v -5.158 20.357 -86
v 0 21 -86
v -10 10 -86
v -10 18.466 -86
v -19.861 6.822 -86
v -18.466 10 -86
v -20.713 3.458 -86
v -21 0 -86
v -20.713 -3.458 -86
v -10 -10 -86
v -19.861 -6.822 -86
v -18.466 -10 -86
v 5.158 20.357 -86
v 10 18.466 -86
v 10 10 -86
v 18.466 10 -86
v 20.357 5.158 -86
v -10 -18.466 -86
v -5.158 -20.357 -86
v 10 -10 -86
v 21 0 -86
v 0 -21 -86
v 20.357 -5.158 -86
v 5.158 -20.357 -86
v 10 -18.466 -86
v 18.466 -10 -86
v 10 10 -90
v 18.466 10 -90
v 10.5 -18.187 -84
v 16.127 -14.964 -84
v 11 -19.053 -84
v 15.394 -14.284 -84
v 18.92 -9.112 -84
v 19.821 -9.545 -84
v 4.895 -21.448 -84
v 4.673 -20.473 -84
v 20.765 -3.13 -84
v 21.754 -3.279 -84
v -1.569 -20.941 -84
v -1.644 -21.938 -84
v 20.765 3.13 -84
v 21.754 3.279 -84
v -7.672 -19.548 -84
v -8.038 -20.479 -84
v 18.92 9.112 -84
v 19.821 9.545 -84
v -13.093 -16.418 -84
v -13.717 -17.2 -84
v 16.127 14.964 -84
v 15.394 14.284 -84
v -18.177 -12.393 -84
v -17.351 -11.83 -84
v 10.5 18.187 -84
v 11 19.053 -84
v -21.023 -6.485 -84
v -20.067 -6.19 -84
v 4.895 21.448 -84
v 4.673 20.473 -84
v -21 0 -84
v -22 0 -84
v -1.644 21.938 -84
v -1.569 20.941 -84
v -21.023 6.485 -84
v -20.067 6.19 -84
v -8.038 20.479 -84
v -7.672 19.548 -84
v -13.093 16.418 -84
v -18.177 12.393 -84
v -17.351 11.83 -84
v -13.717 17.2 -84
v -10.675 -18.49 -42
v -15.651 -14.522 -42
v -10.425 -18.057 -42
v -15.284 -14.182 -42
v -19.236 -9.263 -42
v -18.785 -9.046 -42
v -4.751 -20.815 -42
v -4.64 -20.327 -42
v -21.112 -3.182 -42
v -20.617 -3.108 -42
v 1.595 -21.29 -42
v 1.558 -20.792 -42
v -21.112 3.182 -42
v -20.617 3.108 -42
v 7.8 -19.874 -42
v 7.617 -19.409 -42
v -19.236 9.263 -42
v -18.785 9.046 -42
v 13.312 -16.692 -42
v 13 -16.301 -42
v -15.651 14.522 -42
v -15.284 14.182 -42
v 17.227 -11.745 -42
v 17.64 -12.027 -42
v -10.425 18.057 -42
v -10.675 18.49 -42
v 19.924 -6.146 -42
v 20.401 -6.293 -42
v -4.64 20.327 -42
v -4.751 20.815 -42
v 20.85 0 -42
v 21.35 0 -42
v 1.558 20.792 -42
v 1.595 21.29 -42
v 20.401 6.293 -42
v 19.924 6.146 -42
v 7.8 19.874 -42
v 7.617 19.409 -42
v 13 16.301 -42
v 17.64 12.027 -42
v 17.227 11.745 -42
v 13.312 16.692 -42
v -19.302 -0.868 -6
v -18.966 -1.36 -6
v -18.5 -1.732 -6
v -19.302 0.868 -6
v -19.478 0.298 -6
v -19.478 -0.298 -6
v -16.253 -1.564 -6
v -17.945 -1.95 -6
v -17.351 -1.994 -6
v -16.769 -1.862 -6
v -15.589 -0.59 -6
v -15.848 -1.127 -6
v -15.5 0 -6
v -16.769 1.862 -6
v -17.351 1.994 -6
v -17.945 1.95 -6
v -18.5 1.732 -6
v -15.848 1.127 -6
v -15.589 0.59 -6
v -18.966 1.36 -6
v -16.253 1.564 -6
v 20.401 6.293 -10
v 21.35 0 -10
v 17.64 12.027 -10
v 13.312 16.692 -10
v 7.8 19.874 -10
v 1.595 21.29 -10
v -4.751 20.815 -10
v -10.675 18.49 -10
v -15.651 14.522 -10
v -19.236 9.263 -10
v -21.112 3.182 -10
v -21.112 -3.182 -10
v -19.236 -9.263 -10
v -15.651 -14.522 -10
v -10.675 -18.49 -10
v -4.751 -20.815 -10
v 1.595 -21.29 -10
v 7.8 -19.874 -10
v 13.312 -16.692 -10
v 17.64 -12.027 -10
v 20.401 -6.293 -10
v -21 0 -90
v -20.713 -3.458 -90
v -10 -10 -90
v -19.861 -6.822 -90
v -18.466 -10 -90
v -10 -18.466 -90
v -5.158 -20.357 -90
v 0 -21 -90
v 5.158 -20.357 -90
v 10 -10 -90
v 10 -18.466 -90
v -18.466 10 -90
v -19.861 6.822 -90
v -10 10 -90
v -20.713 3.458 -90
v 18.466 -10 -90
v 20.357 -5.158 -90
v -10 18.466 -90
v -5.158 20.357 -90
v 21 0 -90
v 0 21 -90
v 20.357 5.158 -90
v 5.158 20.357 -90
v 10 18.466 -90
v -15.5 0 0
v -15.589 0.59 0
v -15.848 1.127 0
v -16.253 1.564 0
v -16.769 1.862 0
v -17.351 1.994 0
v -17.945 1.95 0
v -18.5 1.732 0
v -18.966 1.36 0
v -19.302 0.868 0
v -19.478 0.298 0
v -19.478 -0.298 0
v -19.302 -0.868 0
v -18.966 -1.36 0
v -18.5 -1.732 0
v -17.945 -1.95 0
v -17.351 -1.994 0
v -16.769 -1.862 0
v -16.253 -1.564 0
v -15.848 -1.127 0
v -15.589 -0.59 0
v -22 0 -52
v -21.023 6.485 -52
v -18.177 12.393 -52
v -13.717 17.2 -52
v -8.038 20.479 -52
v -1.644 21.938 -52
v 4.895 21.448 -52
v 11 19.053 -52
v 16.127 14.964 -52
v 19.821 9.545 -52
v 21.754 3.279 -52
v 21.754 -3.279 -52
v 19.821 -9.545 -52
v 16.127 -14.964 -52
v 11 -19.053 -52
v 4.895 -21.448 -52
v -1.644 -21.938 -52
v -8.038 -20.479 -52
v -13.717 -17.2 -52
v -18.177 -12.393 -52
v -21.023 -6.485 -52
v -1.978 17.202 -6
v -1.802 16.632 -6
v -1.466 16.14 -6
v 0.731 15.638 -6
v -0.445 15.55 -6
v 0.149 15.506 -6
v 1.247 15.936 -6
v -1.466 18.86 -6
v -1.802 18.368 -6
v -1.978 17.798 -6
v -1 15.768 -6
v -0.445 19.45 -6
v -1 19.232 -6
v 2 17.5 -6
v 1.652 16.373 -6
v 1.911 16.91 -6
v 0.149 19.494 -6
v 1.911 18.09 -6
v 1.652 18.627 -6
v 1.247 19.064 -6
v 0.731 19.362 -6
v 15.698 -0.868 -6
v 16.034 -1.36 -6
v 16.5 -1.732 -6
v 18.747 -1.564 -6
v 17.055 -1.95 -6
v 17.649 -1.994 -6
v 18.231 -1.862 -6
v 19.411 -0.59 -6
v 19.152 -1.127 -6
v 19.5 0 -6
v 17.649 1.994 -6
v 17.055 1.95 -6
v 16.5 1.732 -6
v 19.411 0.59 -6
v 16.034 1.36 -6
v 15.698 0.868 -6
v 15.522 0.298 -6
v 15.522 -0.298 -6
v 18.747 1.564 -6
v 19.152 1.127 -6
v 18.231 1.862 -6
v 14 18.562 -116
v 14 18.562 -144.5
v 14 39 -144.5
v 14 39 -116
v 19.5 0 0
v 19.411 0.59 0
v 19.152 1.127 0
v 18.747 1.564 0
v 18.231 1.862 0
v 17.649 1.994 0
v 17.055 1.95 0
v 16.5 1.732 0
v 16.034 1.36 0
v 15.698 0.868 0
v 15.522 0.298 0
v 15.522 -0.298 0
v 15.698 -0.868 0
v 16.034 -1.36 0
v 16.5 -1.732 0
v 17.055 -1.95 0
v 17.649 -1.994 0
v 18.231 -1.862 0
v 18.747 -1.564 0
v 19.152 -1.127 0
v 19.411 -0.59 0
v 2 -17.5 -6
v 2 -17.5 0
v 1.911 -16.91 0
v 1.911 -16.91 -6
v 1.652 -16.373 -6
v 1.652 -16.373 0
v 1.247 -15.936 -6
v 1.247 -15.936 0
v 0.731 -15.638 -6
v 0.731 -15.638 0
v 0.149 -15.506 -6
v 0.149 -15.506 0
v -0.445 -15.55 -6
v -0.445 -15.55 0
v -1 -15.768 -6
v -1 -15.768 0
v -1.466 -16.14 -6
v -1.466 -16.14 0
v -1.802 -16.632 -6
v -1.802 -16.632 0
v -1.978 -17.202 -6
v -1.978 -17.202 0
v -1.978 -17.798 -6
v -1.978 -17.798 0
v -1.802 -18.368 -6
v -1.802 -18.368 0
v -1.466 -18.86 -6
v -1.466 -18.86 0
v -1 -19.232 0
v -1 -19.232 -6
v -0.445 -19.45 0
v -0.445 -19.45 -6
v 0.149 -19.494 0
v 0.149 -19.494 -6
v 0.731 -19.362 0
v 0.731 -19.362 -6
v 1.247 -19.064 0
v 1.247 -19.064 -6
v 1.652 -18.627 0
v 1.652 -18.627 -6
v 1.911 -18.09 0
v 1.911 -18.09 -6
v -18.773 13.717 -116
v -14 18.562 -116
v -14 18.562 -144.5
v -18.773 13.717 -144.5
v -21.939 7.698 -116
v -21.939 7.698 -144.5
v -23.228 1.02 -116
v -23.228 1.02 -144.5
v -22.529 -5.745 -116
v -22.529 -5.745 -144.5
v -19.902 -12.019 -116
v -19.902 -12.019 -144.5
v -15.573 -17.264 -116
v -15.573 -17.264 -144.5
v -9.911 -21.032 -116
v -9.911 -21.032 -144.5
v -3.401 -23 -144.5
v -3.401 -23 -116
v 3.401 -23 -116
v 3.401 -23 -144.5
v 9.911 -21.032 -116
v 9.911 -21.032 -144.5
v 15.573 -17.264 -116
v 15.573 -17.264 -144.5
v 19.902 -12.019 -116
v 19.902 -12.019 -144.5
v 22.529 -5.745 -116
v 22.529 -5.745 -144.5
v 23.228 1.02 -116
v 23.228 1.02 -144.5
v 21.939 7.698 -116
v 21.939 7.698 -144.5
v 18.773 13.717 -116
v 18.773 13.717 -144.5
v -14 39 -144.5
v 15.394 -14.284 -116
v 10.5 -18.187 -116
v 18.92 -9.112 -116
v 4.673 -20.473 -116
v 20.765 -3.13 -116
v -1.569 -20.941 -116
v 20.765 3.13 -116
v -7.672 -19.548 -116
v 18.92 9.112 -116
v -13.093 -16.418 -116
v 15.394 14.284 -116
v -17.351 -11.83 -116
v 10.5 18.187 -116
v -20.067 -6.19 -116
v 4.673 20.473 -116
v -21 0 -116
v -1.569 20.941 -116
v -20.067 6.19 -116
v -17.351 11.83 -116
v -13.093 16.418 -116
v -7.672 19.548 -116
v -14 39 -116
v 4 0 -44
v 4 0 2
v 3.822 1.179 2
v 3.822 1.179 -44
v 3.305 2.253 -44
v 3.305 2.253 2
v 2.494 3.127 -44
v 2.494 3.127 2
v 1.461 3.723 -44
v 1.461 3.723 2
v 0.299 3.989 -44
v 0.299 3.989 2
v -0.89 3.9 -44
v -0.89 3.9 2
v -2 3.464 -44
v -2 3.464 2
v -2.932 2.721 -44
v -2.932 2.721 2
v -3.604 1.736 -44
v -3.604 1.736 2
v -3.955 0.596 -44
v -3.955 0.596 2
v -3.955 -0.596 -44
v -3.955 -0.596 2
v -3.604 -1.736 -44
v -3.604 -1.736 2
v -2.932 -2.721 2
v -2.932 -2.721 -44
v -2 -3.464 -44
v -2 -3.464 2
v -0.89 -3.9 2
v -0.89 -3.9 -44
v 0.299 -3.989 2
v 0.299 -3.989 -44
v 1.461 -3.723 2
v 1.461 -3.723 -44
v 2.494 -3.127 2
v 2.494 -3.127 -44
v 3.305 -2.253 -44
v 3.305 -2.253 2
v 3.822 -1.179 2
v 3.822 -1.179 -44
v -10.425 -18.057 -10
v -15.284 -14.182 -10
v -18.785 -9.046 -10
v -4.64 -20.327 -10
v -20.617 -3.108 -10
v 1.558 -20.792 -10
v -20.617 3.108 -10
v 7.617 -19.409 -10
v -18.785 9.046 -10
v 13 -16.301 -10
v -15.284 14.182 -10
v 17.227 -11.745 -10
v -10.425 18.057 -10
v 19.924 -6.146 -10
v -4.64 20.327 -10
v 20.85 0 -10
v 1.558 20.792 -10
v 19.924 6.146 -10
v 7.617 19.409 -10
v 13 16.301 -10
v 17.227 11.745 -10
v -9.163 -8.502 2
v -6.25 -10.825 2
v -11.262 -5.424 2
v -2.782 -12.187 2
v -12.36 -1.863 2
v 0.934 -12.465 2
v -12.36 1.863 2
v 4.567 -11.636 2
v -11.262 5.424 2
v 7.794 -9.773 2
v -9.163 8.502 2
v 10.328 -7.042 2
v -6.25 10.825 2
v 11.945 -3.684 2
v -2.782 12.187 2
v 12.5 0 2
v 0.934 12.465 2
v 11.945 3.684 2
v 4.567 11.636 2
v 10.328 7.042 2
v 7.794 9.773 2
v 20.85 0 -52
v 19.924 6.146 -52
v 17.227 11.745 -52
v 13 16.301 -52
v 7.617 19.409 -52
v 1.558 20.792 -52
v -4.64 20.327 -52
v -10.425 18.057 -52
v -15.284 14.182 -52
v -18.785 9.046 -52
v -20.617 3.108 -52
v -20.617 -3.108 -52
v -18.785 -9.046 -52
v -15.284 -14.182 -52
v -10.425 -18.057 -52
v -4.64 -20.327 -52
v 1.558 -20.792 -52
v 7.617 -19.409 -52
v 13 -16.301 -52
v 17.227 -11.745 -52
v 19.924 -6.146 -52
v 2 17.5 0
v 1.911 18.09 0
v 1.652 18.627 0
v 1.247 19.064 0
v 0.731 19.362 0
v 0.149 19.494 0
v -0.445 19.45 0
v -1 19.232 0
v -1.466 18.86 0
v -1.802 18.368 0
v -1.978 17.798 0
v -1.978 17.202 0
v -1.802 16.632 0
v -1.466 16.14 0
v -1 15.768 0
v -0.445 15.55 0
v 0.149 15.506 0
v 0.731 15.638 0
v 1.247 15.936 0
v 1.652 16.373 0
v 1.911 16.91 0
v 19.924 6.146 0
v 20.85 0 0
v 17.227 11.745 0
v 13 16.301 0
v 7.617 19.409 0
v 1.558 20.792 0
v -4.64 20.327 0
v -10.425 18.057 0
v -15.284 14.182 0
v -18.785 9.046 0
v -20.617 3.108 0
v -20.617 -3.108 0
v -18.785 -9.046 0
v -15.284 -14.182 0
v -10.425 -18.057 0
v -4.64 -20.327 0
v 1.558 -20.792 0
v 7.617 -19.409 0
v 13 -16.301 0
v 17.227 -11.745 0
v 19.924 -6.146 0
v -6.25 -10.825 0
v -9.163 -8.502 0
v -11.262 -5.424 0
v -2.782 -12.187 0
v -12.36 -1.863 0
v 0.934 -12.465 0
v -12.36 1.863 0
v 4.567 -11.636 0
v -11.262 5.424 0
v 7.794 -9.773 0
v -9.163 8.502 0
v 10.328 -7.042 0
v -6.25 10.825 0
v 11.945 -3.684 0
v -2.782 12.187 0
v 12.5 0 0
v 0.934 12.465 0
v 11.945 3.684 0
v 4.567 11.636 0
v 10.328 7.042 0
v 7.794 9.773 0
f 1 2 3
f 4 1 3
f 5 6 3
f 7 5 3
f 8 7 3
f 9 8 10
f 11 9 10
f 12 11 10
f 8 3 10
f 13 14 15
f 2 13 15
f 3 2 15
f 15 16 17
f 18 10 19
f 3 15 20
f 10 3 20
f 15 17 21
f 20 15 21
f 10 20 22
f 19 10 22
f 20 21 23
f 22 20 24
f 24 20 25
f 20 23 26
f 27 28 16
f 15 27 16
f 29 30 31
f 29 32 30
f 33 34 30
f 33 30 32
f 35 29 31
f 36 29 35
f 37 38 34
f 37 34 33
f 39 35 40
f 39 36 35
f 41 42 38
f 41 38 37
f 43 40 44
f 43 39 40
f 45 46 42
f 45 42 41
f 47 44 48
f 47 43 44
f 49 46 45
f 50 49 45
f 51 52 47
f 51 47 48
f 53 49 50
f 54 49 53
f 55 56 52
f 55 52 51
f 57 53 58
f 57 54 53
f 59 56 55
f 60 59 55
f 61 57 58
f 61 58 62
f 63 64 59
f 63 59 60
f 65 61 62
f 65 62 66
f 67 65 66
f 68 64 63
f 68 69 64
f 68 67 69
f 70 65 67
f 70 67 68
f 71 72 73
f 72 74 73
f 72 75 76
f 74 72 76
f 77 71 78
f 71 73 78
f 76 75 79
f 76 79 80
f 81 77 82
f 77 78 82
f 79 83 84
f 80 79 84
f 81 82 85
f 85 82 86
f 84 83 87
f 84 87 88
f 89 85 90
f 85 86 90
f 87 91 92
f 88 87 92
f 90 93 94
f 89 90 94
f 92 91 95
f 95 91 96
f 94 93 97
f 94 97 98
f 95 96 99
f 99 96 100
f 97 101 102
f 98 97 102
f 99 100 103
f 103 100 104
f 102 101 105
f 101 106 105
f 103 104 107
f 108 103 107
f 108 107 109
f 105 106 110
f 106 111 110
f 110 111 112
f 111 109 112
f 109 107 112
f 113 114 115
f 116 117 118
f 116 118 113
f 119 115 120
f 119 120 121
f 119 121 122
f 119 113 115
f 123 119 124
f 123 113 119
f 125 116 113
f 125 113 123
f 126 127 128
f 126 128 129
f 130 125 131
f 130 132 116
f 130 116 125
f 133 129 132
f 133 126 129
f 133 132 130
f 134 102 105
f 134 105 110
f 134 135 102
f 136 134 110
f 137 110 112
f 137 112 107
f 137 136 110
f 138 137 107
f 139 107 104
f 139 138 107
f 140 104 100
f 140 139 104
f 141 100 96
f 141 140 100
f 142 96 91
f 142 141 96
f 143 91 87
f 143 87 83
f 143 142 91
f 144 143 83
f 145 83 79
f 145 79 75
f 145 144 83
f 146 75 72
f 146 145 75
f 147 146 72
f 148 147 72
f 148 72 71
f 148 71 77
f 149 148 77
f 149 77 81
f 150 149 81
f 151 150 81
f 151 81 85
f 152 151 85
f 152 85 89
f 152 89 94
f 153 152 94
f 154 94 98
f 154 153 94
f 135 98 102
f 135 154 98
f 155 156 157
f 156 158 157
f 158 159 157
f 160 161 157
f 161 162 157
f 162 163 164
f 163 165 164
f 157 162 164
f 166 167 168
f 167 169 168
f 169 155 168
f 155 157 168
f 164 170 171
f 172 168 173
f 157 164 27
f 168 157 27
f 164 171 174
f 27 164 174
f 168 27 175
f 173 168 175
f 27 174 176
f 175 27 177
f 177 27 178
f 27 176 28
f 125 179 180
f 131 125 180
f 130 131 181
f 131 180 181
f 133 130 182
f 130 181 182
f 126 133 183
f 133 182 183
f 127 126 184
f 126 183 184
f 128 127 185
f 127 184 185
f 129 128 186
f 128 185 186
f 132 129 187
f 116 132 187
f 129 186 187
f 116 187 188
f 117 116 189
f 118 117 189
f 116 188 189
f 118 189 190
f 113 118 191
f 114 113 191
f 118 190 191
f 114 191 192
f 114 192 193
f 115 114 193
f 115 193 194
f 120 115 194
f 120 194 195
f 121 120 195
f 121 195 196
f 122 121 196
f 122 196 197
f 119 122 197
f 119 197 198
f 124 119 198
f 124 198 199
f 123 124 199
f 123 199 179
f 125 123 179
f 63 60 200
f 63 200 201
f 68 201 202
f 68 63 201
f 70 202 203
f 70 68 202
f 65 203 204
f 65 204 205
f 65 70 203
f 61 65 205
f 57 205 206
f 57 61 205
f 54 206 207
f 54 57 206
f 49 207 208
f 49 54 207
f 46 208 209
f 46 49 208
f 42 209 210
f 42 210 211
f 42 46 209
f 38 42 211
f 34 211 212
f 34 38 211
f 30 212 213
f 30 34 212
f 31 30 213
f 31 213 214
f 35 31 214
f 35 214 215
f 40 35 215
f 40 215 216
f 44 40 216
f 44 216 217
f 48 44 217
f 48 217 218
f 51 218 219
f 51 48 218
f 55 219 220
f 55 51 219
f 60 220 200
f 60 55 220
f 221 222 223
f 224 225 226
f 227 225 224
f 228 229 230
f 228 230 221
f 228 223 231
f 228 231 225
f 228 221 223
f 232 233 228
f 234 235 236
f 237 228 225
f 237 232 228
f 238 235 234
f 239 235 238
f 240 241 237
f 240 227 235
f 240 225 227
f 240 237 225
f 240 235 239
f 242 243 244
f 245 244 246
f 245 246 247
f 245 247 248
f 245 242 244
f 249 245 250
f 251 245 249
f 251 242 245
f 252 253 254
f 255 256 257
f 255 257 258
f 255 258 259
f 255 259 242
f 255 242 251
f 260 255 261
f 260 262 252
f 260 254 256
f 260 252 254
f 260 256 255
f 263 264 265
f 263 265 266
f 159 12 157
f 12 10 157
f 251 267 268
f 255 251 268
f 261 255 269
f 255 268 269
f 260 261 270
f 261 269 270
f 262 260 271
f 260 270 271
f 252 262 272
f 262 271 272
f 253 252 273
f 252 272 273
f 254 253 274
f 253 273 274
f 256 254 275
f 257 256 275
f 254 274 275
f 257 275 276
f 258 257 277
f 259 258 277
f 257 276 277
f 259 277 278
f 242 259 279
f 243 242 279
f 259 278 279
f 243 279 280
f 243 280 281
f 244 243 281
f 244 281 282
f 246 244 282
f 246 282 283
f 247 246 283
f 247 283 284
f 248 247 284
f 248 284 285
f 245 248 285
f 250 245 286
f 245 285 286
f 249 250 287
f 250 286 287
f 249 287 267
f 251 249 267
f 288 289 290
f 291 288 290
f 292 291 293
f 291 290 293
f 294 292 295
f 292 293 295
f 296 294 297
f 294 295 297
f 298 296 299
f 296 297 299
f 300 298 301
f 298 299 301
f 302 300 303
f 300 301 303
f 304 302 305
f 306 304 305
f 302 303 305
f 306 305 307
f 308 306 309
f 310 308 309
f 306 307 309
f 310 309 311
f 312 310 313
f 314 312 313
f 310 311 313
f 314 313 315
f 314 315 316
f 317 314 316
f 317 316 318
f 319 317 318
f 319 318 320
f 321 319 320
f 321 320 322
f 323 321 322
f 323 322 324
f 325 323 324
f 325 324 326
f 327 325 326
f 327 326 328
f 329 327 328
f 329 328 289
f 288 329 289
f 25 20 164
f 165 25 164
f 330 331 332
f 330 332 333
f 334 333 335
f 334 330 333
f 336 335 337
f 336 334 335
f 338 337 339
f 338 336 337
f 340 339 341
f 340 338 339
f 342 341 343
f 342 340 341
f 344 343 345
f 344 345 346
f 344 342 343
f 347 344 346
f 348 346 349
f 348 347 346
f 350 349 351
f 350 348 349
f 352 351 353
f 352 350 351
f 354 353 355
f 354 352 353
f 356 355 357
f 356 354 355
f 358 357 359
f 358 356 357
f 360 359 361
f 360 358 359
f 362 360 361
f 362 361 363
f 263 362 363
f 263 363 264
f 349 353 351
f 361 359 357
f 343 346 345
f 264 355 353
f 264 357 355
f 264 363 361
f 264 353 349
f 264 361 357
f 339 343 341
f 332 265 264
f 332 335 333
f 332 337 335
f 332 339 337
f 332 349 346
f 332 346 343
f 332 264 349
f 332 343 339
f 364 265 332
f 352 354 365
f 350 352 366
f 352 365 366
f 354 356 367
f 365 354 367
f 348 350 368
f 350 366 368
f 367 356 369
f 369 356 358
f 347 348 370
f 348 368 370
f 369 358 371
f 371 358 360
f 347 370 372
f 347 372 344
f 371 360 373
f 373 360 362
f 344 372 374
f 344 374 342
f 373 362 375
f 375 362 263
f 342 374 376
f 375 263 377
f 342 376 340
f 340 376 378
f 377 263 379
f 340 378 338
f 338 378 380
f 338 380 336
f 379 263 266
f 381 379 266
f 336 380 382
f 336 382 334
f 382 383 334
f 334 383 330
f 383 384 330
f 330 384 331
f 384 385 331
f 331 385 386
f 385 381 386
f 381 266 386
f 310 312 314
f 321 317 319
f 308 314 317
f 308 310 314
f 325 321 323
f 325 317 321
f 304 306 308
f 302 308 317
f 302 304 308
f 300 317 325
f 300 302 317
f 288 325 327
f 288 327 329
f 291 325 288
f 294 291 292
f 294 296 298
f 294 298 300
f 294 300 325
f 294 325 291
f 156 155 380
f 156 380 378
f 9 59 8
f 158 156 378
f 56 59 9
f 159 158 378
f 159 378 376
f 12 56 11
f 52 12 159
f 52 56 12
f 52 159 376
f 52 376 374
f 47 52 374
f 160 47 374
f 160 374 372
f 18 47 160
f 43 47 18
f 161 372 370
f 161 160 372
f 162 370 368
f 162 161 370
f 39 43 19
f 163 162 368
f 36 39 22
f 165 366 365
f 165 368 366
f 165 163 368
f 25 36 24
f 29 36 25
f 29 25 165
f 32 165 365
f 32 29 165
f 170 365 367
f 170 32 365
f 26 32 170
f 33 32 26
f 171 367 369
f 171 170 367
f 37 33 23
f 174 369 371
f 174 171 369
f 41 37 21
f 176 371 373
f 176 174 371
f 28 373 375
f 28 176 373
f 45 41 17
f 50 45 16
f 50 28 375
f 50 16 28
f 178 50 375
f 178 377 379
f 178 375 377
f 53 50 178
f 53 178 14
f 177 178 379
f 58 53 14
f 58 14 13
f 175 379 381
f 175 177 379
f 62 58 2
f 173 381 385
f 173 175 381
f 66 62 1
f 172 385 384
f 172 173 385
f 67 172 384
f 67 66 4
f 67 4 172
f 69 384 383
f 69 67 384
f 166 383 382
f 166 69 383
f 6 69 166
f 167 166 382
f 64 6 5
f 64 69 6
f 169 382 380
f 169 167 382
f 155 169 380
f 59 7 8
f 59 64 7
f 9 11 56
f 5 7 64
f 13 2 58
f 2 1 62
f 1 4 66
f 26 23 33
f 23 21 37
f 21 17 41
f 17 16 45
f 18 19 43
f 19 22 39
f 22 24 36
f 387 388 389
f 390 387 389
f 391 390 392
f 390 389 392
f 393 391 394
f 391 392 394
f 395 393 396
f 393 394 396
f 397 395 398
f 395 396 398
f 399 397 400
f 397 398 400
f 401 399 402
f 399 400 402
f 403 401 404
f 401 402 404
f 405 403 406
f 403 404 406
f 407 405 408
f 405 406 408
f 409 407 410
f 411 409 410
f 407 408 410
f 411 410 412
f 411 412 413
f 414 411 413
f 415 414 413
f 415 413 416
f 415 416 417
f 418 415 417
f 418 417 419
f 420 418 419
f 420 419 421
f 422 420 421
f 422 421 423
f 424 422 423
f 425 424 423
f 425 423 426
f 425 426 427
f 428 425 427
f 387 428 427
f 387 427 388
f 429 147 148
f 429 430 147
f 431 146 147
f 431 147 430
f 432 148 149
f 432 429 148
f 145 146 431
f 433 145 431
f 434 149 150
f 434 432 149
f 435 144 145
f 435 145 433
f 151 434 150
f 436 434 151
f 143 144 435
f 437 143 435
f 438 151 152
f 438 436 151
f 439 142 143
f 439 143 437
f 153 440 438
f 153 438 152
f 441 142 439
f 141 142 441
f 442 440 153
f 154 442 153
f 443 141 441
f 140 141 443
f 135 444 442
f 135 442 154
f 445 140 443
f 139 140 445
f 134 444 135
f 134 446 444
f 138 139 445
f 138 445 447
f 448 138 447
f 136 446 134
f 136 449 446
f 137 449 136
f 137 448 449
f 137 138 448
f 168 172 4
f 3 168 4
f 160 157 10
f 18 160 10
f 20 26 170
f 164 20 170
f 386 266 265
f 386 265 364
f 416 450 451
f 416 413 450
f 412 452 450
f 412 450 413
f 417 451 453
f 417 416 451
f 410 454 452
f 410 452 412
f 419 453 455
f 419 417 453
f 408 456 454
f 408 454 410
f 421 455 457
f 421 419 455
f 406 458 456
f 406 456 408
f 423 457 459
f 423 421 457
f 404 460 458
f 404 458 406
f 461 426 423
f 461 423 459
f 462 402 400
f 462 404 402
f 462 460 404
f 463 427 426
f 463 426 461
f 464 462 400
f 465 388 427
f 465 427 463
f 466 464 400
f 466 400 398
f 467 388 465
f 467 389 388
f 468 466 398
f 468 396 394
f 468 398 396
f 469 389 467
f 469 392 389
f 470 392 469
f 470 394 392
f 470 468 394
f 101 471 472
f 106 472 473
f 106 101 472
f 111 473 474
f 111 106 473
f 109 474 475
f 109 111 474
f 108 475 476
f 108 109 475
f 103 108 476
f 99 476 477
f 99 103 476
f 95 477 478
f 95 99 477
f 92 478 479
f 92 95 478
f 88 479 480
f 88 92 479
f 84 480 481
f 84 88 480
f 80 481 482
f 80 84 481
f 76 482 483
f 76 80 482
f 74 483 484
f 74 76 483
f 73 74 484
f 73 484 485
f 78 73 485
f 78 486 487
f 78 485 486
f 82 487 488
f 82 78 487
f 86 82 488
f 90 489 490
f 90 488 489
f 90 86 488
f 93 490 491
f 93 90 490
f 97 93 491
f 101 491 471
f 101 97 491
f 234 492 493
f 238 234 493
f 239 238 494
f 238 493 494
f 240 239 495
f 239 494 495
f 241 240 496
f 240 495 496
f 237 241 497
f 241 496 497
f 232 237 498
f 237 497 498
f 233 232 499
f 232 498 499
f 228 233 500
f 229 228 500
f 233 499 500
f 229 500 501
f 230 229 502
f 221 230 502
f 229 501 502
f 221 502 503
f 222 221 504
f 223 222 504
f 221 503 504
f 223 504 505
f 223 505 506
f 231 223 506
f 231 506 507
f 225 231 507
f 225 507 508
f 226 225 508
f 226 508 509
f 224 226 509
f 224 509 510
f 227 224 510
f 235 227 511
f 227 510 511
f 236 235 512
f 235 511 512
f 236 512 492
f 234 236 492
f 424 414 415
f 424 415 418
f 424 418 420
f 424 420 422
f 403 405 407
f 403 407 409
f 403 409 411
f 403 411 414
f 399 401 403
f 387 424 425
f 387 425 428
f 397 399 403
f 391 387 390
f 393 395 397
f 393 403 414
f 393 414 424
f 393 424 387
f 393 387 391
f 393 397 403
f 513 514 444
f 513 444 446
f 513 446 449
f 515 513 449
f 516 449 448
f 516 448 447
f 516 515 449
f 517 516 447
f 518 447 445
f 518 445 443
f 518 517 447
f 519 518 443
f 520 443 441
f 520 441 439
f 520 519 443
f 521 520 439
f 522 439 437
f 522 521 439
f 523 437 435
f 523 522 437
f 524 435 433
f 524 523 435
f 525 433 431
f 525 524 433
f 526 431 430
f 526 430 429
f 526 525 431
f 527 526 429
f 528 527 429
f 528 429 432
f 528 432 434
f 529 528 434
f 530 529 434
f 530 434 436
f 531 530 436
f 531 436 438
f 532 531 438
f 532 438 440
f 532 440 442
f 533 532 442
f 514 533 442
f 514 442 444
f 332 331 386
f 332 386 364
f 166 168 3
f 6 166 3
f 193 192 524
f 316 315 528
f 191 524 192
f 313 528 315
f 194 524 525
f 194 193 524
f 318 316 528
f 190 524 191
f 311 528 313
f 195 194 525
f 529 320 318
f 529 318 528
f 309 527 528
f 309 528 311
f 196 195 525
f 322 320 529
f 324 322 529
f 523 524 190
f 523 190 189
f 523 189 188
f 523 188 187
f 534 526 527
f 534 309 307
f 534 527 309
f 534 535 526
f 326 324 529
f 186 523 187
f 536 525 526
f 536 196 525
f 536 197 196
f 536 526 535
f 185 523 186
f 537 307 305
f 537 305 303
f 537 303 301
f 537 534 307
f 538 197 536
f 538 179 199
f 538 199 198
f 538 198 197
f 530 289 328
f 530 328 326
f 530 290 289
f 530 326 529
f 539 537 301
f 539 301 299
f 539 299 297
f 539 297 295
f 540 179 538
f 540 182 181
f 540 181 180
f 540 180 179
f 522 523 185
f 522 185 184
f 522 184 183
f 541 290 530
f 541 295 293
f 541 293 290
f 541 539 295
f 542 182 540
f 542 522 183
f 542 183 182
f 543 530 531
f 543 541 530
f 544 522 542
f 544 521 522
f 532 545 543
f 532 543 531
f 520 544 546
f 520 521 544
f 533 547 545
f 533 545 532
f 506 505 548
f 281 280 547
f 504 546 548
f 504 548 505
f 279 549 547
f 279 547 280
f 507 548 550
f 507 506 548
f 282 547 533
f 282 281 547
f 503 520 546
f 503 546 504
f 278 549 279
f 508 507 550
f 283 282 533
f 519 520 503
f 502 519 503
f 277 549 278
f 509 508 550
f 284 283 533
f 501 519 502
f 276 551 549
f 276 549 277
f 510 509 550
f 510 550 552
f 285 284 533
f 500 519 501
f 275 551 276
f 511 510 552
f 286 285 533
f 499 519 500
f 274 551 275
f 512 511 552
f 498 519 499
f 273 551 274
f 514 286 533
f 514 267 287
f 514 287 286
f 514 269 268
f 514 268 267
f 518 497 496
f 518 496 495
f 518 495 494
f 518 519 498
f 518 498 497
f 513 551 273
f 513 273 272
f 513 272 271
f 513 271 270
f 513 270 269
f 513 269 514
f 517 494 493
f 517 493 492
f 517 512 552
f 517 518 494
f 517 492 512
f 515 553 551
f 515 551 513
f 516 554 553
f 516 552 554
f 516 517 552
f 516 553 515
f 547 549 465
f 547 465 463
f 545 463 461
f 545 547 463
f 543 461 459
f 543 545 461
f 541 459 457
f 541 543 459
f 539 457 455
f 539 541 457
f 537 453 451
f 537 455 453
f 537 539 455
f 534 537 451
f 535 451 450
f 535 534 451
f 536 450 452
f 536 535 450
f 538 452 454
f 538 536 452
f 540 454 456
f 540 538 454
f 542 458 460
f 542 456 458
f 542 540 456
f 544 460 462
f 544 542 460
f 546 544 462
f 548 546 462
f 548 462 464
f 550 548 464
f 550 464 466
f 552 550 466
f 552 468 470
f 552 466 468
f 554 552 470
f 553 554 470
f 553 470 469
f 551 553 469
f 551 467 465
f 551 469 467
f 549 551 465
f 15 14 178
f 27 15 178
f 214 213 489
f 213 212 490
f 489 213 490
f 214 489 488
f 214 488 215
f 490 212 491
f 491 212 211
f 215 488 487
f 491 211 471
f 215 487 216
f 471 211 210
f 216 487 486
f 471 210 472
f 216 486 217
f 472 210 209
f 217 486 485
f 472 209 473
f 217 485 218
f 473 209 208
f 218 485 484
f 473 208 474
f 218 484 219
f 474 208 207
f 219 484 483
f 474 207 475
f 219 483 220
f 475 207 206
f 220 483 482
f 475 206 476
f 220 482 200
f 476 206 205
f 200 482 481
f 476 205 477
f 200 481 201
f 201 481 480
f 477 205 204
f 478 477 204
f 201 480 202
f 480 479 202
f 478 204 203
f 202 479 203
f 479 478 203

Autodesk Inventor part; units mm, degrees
ref_plane "YZ Plane" through (0, 0, 0) normal (1, 0, 0) x (0, 1, 0)
ref_plane "XY Plane" through (0, 0, 0) normal (0, 0, 1) x (1, 0, 0)
sketch "Sketch1" plane through (0, 0, 0) normal (0, 0, 1) x (1, 0, 0)
  circle A0 centre (0, 0) radius 20.85
  dimension "d0" = 41.7
extrude "Extrusion1" add sketch "Sketch1" against normal blind 116
ref_plane "Work Plane3" through (0, 0, -44) normal (0, 0, -1) x (-1, 0, 0)
ref_plane "Work Plane2" through (0, 0, -52) normal (0, 0, -1) x (-1, 0, 0)
sketch "Sketch2" plane through (0, 0, -84) normal (0, 0, -1) x (-1, 0, 0)
  circle A0 centre (0, 0) radius 20.85 projected
  circle A1 centre (0, 0) radius 21
  dimension "d6" = 42
extrude "Extrusion2" add sketch "Sketch2" along normal up to surface (32 mm away)
sketch "Sketch3" plane through (0, 0, -84) normal (0, 0, -1) x (-1, 0, 0)
  circle A0 centre (0, 0) radius 22
  circle A1 centre (0, 0) radius 20.85 projected
  dimension "d9" = 44
extrude "Extrusion3" add sketch "Sketch3" against normal up to surface (32 mm away)
sketch "Sketch4" plane through (0, 0, 0) normal (0, 0, 1) x (1, 0, 0)
  circle A0 centre (0, 0) radius 17.5
  circle A1 centre (0, 17.5) radius 2
  circle A2 centre (-17.5, 0) radius 2
  circle A3 centre (0, -17.5) radius 2
  circle A4 centre (17.5, 0) radius 2
  dimension "d12" = 35
  dimension "d13" = 4
  dimension "d16" = 360
extrude "Extrusion4" cut sketch "Sketch4" against normal blind 6 contours A0 A4 | A0 A4 | A1 A0 | A0 A1 | A3 A0 | A0 A3 | A2 A0 | A0 A2
sketch "Sketch5" plane through (0, 0, 0) normal (0, 0, 1) x (1, 0, 0)
  circle A0 centre (0, 0) radius 12.5
  dimension "d20" = 25
extrude "Extrusion5" add sketch "Sketch5" along normal blind 2
sketch "Sketch6" plane through (0, 0, 2) normal (0, 0, 1) x (1, 0, 0)
  circle A0 centre (0, 0) radius 4
  dimension "d23" = 8
extrude "Extrusion6" cut sketch "Sketch6" against normal up to surface (46 mm away)
sketch "Sketch7" plane through (0, 0, -116) normal (0, 0, -1) x (-1, 0, 0)
  circle A0 centre (0, 0) radius 23.25
  circle A1 centre (0, 0) radius 21 projected
  dimension "d26" = 46.5
  dimension "d27" = 42
extrude "Extrusion7" add sketch "Sketch7" along normal blind 28.5 contours A0 | A1
ref_plane "Work Plane4" through (0, 17.5, 0) normal (0, 1, 0) x (-1, 0, 0)
sketch "Sketch8" plane through (0, 17.5, 0) normal (0, 1, 0) x (-1, 0, 0)
  line L0 (-23.25, -144.5) -> (23.25, -144.5) projected
  line L1 (-23.25, -116) -> (23.25, -116) projected
  line L2 (-23.25, -116) -> (23.25, -116) projected
  line L3 (-23.25, -144.5) -> (23.25, -144.5) projected
  line L4 (23.25, -116) -> (-23.25, -144.5)
  line L5 (-14, -116) -> (14, -116)
  line L6 (14, -116) -> (14, -144.5)
  line L7 (14, -144.5) -> (-14, -144.5)
  line L8 (-14, -144.5) -> (-14, -116)
  line L9 (-14, -116) -> (14, -144.5) construction
  line L10 (14, -116) -> (-14, -144.5) construction
  point P0 (0, 0)
  point P1 (0, -130.25)
  dimension "d31" = 28
extrude "Extrusion8" add sketch "Sketch8" along normal blind 21.5 contours L8 L4 L6 L0 | L8 L1 L6 L4
ref_plane "Work Plane5" through (0, 0, -42) normal (0, 0, 1) x (1, 0, 0)
ref_plane "Work Plane6" through (0, 0, -10) normal (0, 0, 1) x (1, 0, 0)
sketch "Sketch9" plane through (0, 0, -10) normal (0, 0, 1) x (1, 0, 0)
  circle A0 centre (0, 0) radius 12.5 projected
  circle A1 centre (-17.5, 0) radius 2 projected
  circle A2 centre (0, 17.5) radius 2 projected
  circle A3 centre (0, -17.5) radius 2 projected
  circle A4 centre (17.5, 0) radius 2 projected
  circle A5 centre (0, 0) radius 20.85 projected
  circle A6 centre (0, 0) radius 4 projected
  circle A7 centre (0, 0) radius 21.35
  dimension "d36" = 42.7
extrude "Extrusion9" add sketch "Sketch9" against normal up to surface (32 mm away) contours A7
ref_plane "Work Plane7" through (0, 21, 0) normal (0, 1, 0) x (-1, 0, 0)
sketch "Sketch10" plane through (0, 21, 0) normal (0, 1, 0) x (-1, 0, 0)
  line L0 (-21, -84) -> (21, -84) projected
  line L1 (-21, -116) -> (21, -116) projected
  line L2 (-21, -84) -> (21, -84) projected
  line L3 (0, -84) -> (0, -88)
  line L4 (-10, -90) -> (10, -90)
  line L5 (10, -90) -> (10, -86)
  line L6 (10, -86) -> (-10, -86)
  line L7 (-10, -86) -> (-10, -90)
  line L8 (-10, -90) -> (10, -86) construction
  line L9 (10, -90) -> (-10, -86) construction
  point P0 (0, 0)
  dimension "d40" = 4
  dimension "d41" = 20
  dimension "d42" = 4
extrude "Extrusion10" cut sketch "Sketch10" against normal through all
pattern_circular "Circular Pattern1" count 2 over 90 about axis through (0, 0, -84) along (0, 0, -1) of "Extrusion10"
thread "Thread1" size "M4x0.7" class "6H" standard "ANSI Metric M Profile" length 146
thread "Thread2" size "M4x0.7" class "6H" standard "ANSI Metric M Profile" length 146
thread "Thread3" size "M4x0.7" class "6H" standard "ANSI Metric M Profile" length 146
thread "Thread4" size "M4x0.7" class "6H" standard "ANSI Metric M Profile" length 146
ref_plane "Work Plane1" through (0, 0, -84) normal (0, 0, -1) x (-1, 0, 0)
properties part number "motorbody"
